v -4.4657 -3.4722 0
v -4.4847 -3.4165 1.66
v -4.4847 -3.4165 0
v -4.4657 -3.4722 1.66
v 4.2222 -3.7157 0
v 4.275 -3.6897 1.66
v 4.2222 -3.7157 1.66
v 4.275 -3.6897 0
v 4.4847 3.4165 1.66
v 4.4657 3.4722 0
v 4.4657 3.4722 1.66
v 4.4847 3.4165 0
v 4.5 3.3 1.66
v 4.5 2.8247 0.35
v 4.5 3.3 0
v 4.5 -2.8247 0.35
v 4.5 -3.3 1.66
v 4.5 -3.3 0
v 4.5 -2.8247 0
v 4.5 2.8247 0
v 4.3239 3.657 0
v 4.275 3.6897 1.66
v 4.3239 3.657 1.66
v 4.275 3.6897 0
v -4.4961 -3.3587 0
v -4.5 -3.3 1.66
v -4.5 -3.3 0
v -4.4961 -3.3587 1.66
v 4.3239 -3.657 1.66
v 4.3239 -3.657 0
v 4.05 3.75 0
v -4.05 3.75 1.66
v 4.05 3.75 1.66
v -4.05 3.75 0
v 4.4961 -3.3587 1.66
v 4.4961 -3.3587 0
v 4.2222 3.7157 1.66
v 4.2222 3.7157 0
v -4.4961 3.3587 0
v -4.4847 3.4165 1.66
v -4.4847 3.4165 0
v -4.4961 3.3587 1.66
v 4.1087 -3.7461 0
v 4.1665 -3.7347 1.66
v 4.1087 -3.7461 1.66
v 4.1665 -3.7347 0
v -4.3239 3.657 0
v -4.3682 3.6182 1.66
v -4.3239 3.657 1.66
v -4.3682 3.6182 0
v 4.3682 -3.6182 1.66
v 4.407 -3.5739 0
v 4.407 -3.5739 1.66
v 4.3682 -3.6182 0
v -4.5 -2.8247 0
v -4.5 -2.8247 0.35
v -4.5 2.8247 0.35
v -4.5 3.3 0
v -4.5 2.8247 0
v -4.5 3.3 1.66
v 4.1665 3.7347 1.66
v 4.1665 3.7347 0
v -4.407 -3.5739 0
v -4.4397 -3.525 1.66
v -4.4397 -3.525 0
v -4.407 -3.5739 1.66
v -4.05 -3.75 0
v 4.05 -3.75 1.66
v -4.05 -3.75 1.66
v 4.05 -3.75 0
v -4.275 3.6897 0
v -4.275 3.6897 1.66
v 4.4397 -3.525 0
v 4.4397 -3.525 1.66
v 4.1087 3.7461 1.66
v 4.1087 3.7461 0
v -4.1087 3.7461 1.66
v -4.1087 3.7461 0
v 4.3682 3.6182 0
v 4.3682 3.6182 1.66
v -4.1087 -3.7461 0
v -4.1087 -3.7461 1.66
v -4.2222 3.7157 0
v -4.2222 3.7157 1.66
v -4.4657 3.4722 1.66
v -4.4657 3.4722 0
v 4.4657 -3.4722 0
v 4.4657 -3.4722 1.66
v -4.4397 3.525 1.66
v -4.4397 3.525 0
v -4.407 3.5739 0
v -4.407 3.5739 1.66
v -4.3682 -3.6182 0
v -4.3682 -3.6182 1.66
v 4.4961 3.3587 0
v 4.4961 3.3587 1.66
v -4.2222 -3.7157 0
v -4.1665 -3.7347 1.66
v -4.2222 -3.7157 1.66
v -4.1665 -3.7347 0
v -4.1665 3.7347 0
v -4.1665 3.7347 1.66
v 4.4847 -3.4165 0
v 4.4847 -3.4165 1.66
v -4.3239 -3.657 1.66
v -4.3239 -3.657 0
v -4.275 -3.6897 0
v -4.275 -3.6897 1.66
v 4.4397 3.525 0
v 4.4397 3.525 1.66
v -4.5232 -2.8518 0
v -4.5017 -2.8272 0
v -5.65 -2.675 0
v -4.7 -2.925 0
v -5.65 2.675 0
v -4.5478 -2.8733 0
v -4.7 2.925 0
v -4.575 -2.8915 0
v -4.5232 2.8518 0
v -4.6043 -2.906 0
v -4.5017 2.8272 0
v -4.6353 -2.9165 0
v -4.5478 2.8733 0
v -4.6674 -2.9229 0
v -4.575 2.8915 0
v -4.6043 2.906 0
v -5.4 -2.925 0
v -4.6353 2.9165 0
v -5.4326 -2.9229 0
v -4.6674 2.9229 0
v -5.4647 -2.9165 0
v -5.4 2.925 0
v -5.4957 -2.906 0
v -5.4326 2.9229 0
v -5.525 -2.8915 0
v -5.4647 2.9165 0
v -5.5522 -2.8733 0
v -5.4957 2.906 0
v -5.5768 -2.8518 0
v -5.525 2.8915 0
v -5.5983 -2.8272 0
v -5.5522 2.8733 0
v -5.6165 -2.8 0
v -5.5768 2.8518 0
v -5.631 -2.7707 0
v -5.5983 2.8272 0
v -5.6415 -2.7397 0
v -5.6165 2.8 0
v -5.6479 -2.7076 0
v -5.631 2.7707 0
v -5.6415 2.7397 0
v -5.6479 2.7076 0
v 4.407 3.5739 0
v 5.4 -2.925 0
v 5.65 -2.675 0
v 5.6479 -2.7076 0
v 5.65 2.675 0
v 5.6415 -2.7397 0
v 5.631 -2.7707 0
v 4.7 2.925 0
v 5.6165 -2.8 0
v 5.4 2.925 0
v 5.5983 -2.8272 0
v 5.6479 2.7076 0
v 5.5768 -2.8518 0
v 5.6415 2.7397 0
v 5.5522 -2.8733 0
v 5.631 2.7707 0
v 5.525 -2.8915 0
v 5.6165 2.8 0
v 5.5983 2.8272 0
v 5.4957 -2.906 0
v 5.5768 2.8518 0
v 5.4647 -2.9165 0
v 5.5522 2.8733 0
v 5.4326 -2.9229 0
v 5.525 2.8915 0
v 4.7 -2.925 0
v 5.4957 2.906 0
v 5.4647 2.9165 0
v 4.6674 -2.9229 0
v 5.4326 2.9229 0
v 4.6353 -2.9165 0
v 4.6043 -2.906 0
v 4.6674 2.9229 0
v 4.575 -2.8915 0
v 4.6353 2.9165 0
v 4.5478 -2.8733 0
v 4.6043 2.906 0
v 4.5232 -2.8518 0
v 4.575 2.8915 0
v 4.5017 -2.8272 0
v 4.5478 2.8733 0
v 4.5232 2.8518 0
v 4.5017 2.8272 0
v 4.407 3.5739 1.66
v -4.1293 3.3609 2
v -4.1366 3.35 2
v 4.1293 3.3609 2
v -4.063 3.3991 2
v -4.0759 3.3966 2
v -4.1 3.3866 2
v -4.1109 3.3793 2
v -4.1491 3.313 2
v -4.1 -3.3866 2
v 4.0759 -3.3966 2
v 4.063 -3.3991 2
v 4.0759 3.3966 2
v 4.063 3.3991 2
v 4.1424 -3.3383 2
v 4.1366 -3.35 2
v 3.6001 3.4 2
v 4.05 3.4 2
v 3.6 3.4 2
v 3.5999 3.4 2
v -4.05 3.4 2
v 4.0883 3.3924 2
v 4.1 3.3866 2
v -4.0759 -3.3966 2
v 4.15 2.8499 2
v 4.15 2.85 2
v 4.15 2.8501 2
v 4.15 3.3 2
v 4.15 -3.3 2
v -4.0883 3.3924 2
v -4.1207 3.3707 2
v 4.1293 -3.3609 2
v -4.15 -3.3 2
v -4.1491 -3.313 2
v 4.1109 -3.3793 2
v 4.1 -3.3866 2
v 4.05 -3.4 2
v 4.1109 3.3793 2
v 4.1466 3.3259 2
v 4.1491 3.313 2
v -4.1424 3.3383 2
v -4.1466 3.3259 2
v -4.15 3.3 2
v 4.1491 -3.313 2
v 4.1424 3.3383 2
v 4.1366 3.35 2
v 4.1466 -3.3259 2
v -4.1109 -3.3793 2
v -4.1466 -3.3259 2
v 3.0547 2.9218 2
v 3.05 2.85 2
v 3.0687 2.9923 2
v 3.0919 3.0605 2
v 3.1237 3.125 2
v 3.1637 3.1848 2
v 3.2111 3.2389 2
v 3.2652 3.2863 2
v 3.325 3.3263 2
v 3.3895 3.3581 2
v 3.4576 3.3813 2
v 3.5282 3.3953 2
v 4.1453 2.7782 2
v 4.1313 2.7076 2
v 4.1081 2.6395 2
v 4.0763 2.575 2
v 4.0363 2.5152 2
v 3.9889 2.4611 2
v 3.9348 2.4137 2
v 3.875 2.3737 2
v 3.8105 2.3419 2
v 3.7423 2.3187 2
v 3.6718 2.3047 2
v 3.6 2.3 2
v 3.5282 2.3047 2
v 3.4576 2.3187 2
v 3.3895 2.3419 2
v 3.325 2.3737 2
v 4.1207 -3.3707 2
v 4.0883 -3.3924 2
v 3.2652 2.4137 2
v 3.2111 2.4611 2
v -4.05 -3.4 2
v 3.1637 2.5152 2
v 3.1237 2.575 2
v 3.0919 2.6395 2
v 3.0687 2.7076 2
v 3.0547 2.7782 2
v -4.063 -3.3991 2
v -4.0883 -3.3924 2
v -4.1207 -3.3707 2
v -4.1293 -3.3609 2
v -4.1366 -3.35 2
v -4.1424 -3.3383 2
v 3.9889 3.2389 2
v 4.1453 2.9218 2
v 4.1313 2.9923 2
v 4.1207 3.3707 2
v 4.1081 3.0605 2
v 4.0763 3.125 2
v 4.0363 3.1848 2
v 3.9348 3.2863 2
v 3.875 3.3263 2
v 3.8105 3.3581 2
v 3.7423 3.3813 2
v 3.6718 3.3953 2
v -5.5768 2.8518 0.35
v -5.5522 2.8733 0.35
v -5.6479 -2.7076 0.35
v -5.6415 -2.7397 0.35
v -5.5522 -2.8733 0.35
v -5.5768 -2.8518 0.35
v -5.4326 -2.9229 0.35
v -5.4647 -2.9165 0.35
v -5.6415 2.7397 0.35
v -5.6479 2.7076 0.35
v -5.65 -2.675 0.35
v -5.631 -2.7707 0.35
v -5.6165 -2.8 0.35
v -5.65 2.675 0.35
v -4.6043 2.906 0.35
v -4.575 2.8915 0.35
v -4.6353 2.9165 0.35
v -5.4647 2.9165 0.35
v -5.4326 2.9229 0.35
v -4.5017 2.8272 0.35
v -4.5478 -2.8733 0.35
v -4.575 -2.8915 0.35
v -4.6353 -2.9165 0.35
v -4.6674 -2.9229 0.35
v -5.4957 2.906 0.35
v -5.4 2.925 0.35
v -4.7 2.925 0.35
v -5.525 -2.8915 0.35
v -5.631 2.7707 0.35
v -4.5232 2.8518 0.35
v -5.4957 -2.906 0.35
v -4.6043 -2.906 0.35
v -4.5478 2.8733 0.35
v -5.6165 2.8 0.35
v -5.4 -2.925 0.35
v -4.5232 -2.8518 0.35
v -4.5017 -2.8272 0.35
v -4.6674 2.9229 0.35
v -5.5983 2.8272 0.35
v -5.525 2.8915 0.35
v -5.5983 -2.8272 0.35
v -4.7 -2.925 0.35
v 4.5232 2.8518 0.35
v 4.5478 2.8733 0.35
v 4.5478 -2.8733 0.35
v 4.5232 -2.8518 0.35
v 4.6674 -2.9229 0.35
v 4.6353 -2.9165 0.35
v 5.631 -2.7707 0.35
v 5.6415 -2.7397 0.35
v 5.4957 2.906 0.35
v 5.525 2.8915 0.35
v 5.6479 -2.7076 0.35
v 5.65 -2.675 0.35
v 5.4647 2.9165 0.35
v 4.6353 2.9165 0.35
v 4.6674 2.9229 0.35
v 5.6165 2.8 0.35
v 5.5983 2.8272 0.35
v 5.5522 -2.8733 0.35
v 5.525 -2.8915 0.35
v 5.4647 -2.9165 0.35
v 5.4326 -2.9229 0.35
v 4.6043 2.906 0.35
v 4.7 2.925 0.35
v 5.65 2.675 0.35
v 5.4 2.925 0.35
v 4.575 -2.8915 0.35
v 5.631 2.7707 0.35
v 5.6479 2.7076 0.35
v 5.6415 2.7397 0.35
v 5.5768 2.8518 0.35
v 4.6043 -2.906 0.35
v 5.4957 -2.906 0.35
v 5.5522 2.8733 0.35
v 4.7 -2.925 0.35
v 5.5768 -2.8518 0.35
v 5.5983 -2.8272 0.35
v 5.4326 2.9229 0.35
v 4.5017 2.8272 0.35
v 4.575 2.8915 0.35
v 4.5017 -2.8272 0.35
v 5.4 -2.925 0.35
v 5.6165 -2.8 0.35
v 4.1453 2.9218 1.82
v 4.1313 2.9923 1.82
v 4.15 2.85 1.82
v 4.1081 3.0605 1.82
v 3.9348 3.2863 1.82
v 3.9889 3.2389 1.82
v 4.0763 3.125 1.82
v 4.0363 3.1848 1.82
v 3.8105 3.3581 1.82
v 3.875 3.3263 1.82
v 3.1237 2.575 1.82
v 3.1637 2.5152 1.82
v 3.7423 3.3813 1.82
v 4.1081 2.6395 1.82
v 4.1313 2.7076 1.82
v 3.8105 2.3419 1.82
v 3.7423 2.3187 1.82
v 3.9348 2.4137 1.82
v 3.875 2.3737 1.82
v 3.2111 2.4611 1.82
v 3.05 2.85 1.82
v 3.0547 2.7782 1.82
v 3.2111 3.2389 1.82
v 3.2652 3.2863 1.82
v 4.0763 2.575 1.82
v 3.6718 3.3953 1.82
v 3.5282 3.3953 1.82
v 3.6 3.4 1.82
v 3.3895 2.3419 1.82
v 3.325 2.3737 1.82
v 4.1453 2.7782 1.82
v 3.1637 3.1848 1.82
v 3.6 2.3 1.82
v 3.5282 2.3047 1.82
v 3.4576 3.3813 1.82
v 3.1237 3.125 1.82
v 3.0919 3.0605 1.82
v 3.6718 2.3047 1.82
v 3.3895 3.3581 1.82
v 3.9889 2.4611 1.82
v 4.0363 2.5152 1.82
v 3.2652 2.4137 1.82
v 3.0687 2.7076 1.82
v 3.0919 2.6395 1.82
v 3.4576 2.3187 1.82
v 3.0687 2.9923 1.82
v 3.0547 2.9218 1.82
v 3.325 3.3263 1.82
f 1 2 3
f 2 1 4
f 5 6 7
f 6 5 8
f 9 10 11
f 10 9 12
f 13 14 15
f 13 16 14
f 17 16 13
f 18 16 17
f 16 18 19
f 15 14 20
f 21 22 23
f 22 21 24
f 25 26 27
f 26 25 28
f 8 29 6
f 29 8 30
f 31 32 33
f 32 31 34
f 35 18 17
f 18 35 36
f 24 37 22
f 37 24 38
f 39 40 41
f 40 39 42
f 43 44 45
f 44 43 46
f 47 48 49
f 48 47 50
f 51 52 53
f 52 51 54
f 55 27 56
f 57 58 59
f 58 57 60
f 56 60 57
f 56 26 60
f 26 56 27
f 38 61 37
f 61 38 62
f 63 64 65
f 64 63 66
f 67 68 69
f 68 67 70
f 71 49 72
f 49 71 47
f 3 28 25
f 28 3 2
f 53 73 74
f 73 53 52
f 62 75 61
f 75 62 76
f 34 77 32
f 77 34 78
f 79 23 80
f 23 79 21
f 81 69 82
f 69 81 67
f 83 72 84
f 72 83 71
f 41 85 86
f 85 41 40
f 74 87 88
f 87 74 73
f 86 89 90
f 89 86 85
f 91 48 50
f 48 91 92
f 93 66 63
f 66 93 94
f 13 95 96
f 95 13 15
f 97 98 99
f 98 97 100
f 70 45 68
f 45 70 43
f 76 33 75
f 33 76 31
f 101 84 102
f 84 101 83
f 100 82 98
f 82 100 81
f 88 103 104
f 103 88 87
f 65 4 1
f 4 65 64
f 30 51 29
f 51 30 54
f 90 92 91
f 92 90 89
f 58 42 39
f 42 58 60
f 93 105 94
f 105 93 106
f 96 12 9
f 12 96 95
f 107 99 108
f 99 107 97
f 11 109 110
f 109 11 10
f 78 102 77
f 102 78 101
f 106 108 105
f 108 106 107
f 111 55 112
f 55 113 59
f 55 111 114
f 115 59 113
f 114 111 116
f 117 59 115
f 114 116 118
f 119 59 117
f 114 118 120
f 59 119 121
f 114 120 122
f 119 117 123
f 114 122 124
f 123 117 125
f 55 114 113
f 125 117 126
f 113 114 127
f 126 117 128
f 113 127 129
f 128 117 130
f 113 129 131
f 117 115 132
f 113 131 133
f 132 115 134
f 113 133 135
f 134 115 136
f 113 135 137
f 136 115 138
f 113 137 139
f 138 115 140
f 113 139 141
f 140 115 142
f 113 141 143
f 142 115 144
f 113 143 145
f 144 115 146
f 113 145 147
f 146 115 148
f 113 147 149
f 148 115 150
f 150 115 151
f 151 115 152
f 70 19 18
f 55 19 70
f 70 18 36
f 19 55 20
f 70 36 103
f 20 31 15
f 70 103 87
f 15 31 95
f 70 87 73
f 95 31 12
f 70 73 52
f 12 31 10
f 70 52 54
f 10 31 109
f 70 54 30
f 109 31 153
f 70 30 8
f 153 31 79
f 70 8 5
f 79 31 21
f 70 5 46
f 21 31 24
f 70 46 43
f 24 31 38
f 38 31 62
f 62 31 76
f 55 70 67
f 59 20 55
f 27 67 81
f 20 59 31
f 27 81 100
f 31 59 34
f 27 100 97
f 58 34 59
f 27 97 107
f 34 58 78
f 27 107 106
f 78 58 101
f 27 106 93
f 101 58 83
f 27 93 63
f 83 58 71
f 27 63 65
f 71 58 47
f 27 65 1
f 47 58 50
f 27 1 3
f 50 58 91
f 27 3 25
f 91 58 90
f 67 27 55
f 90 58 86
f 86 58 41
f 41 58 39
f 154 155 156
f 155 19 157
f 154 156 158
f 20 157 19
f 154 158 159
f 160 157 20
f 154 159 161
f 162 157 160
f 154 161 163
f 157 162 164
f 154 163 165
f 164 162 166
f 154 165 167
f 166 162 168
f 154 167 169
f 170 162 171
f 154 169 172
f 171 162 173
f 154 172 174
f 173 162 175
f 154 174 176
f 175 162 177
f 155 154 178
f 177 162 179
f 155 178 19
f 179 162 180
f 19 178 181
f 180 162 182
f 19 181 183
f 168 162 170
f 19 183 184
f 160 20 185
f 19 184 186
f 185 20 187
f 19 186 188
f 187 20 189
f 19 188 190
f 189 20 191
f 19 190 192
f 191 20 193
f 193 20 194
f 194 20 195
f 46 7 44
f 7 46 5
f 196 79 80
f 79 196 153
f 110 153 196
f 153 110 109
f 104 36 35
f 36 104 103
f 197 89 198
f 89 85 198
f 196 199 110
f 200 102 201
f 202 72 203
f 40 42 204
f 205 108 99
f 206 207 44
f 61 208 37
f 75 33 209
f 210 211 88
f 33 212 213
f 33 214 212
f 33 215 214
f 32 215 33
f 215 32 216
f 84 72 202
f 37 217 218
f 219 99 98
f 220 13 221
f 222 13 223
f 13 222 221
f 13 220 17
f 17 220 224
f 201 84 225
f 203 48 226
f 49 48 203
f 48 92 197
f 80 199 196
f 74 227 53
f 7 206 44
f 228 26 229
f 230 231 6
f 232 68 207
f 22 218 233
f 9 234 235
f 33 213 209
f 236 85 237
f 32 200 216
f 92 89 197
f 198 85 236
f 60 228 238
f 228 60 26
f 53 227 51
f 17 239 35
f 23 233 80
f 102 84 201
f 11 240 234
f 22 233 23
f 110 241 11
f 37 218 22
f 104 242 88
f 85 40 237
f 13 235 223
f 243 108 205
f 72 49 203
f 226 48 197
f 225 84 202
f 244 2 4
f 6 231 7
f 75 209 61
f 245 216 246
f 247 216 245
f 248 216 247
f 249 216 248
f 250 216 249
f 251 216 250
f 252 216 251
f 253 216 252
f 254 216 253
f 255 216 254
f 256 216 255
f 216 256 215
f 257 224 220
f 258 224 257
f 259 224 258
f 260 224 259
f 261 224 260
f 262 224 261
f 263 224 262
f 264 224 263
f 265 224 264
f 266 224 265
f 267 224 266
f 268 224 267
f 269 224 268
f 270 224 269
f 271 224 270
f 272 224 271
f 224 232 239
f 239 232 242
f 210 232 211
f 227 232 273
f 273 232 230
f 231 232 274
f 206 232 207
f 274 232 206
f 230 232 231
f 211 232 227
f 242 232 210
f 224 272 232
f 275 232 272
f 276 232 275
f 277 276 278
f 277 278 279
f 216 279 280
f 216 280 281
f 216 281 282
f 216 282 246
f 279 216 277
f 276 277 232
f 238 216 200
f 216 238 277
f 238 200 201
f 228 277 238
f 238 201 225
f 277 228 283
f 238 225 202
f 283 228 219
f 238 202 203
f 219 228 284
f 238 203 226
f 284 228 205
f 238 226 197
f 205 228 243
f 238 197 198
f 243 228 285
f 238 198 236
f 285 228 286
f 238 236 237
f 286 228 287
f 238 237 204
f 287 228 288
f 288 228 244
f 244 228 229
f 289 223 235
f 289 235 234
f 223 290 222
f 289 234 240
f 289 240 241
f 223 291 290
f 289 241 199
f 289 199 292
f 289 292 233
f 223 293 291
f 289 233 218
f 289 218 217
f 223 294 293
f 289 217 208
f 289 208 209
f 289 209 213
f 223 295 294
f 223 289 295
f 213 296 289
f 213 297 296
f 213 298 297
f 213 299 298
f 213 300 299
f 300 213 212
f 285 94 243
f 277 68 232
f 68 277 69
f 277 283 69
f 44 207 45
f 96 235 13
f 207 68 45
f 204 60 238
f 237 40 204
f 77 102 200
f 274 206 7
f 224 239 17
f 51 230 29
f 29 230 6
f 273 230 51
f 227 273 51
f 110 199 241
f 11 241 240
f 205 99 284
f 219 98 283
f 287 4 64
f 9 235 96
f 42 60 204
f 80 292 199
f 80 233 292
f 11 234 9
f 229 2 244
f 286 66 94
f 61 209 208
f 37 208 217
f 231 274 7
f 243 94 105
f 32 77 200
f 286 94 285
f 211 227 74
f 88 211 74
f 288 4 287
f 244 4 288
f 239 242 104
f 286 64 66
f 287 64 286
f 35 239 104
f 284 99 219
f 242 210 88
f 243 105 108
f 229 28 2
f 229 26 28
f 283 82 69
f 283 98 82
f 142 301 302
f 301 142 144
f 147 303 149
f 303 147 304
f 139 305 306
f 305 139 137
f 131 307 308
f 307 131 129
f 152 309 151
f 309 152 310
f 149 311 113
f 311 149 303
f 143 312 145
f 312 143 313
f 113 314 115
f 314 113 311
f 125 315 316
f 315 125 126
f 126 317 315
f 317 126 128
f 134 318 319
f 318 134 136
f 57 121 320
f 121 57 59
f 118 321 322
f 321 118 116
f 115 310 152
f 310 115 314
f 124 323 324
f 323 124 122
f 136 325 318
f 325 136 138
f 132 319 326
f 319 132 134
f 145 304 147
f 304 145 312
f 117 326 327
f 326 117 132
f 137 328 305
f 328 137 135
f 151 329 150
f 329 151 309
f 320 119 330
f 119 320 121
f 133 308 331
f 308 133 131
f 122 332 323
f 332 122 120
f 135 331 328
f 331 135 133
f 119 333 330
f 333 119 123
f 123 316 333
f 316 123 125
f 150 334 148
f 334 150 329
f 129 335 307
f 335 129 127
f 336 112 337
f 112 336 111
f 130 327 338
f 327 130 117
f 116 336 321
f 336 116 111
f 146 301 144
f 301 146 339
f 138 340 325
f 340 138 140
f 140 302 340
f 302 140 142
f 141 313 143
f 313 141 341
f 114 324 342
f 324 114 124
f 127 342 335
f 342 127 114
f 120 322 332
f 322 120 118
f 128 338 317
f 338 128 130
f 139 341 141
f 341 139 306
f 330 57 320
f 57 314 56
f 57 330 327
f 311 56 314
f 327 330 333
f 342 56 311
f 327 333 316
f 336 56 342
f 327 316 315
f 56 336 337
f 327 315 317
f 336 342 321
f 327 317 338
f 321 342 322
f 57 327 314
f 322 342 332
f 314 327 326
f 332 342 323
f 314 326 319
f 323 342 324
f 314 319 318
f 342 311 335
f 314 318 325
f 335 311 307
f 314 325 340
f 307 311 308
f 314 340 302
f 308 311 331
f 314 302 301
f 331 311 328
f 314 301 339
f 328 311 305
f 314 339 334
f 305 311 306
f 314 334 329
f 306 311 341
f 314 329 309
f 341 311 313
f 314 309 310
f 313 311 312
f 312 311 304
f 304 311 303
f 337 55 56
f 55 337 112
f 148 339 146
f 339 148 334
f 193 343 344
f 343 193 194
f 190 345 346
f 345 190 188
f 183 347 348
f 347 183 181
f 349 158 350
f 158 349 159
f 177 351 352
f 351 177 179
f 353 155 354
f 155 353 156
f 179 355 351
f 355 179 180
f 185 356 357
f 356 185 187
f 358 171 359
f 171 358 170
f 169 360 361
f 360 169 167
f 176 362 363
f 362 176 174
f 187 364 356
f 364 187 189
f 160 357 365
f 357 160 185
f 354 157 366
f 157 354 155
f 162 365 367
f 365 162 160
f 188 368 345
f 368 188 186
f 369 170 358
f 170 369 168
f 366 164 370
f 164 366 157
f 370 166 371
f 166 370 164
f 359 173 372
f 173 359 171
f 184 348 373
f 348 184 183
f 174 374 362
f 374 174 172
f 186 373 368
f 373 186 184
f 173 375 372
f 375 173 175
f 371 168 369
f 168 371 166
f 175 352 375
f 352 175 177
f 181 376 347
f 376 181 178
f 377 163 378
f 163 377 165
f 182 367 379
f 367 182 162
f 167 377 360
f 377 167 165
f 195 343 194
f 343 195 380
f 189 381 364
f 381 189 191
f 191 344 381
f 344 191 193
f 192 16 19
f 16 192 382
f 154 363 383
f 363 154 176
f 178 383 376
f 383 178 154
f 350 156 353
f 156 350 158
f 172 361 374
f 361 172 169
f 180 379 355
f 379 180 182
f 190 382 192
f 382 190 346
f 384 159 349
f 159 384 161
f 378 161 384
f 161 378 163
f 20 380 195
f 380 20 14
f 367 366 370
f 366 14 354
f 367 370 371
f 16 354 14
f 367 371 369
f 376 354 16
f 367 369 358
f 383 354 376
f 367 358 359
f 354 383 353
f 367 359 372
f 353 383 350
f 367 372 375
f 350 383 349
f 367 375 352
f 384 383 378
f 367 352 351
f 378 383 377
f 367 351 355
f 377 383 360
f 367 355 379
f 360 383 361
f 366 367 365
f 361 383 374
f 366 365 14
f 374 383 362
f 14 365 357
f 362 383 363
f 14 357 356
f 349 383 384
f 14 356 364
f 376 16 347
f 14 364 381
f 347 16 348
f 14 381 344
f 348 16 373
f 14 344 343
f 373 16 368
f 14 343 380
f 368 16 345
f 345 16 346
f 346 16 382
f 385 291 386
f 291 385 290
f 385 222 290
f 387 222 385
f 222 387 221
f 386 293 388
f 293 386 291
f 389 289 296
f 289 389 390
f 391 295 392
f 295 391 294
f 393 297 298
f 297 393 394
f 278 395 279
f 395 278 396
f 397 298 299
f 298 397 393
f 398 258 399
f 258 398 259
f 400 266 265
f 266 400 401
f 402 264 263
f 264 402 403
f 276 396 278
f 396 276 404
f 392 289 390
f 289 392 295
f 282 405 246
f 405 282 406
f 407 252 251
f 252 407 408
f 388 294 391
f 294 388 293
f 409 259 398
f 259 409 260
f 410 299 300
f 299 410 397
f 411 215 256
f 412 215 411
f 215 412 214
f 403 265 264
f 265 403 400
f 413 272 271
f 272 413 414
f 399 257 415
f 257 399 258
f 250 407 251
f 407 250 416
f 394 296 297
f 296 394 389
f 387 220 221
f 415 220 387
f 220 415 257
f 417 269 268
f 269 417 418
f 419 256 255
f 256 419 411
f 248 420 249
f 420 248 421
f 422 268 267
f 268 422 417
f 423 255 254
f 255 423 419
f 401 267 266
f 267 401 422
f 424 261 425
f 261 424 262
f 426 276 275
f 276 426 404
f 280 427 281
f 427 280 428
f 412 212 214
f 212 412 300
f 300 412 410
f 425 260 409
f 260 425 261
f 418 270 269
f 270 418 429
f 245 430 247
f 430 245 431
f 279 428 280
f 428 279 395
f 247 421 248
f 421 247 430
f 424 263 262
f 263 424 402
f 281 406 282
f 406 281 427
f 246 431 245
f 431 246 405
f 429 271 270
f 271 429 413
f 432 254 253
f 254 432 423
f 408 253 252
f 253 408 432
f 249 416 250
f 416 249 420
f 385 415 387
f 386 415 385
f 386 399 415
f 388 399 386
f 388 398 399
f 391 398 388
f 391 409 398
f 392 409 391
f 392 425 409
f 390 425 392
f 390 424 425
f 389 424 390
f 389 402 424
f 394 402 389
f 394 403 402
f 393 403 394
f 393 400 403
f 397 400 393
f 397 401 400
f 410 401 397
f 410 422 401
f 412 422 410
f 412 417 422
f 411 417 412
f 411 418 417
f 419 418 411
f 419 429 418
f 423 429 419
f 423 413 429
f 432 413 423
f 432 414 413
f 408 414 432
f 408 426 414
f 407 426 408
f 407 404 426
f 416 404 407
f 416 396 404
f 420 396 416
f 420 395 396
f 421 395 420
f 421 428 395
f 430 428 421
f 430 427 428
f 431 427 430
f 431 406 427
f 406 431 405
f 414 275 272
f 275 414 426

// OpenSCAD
// SMD package with visible terminals, chamfered body, and polarity mark
// Exact overall dimensions: 11.40 x 7.50 x 2.00 (L x W x H)
// One connected solid (union of body + terminals; polarity mark is a shallow recess)

$fn = 48;

L = 11.40;
W = 7.50;
H = 2.00;

// Terminal geometry (kept within overall L)
term_len = 1.20;                 // along X
term_thk = 0.35;                 // along Z (bottom thickness)
term_w   = W * 0.78;             // along Y

// Body sits between terminals
body_L = L - 2*term_len;

// Edge treatments
chamfer = 0.35;                  // top edge chamfer amount
corner_r = 0.45;                 // body corner radius (plan view)

// Polarity mark (recess on top near one corner)
mark_r = 0.55;
mark_depth = 0.18;

// Helpers
module rounded_rect_2d(x, y, r){
    r2 = min(r, min(x,y)/2);
    hull() {
        for (sx = [-1, 1], sy = [-1, 1])
            translate([sx*(x/2 - r2), sy*(y/2 - r2)]) circle(r=r2);
    }
}

module body_with_chamfer(){
    // Create a chamfered top by hulling a slightly smaller top profile to the base profile
    base_h = H - chamfer;
    top_h  = chamfer;

    union() {
        // Main vertical walls
        linear_extrude(height=base_h, center=false)
            rounded_rect_2d(body_L, W, corner_r);

        // Chamfered top section
        translate([0,0,base_h])
            hull() {
                linear_extrude(height=0.01, center=false)
                    rounded_rect_2d(body_L, W, corner_r);

                linear_extrude(height=top_h, center=false)
                    rounded_rect_2d(body_L - 2*chamfer, W - 2*chamfer, max(0, corner_r - chamfer));
            }
    }
}

module terminal(){
    // Slightly rounded terminal block
    linear_extrude(height=term_thk, center=false)
        rounded_rect_2d(term_len, term_w, min(0.25, term_len/2));
}

difference() {
    union() {
        // Body centered in X, Y; bottom at Z=0, top at Z=H
        translate([0,0,0]) body_with_chamfer();

        // Terminals on bottom, connected to body ends with tiny overlap
        overlap = 0.05;

        // Left terminal
        translate([-(body_L/2 + term_len/2 - overlap), 0, 0])
            terminal();

        // Right terminal
        translate([ (body_L/2 + term_len/2 - overlap), 0, 0])
            terminal();
    }

    // Polarity mark: shallow recess on top near +X,+Y corner
    translate([ body_L/2 - (mark_r + 0.35),
                W/2     - (mark_r + 0.35),
                H - mark_depth ])
        cylinder(h=mark_depth + 0.02, r=mark_r, center=false);
}
